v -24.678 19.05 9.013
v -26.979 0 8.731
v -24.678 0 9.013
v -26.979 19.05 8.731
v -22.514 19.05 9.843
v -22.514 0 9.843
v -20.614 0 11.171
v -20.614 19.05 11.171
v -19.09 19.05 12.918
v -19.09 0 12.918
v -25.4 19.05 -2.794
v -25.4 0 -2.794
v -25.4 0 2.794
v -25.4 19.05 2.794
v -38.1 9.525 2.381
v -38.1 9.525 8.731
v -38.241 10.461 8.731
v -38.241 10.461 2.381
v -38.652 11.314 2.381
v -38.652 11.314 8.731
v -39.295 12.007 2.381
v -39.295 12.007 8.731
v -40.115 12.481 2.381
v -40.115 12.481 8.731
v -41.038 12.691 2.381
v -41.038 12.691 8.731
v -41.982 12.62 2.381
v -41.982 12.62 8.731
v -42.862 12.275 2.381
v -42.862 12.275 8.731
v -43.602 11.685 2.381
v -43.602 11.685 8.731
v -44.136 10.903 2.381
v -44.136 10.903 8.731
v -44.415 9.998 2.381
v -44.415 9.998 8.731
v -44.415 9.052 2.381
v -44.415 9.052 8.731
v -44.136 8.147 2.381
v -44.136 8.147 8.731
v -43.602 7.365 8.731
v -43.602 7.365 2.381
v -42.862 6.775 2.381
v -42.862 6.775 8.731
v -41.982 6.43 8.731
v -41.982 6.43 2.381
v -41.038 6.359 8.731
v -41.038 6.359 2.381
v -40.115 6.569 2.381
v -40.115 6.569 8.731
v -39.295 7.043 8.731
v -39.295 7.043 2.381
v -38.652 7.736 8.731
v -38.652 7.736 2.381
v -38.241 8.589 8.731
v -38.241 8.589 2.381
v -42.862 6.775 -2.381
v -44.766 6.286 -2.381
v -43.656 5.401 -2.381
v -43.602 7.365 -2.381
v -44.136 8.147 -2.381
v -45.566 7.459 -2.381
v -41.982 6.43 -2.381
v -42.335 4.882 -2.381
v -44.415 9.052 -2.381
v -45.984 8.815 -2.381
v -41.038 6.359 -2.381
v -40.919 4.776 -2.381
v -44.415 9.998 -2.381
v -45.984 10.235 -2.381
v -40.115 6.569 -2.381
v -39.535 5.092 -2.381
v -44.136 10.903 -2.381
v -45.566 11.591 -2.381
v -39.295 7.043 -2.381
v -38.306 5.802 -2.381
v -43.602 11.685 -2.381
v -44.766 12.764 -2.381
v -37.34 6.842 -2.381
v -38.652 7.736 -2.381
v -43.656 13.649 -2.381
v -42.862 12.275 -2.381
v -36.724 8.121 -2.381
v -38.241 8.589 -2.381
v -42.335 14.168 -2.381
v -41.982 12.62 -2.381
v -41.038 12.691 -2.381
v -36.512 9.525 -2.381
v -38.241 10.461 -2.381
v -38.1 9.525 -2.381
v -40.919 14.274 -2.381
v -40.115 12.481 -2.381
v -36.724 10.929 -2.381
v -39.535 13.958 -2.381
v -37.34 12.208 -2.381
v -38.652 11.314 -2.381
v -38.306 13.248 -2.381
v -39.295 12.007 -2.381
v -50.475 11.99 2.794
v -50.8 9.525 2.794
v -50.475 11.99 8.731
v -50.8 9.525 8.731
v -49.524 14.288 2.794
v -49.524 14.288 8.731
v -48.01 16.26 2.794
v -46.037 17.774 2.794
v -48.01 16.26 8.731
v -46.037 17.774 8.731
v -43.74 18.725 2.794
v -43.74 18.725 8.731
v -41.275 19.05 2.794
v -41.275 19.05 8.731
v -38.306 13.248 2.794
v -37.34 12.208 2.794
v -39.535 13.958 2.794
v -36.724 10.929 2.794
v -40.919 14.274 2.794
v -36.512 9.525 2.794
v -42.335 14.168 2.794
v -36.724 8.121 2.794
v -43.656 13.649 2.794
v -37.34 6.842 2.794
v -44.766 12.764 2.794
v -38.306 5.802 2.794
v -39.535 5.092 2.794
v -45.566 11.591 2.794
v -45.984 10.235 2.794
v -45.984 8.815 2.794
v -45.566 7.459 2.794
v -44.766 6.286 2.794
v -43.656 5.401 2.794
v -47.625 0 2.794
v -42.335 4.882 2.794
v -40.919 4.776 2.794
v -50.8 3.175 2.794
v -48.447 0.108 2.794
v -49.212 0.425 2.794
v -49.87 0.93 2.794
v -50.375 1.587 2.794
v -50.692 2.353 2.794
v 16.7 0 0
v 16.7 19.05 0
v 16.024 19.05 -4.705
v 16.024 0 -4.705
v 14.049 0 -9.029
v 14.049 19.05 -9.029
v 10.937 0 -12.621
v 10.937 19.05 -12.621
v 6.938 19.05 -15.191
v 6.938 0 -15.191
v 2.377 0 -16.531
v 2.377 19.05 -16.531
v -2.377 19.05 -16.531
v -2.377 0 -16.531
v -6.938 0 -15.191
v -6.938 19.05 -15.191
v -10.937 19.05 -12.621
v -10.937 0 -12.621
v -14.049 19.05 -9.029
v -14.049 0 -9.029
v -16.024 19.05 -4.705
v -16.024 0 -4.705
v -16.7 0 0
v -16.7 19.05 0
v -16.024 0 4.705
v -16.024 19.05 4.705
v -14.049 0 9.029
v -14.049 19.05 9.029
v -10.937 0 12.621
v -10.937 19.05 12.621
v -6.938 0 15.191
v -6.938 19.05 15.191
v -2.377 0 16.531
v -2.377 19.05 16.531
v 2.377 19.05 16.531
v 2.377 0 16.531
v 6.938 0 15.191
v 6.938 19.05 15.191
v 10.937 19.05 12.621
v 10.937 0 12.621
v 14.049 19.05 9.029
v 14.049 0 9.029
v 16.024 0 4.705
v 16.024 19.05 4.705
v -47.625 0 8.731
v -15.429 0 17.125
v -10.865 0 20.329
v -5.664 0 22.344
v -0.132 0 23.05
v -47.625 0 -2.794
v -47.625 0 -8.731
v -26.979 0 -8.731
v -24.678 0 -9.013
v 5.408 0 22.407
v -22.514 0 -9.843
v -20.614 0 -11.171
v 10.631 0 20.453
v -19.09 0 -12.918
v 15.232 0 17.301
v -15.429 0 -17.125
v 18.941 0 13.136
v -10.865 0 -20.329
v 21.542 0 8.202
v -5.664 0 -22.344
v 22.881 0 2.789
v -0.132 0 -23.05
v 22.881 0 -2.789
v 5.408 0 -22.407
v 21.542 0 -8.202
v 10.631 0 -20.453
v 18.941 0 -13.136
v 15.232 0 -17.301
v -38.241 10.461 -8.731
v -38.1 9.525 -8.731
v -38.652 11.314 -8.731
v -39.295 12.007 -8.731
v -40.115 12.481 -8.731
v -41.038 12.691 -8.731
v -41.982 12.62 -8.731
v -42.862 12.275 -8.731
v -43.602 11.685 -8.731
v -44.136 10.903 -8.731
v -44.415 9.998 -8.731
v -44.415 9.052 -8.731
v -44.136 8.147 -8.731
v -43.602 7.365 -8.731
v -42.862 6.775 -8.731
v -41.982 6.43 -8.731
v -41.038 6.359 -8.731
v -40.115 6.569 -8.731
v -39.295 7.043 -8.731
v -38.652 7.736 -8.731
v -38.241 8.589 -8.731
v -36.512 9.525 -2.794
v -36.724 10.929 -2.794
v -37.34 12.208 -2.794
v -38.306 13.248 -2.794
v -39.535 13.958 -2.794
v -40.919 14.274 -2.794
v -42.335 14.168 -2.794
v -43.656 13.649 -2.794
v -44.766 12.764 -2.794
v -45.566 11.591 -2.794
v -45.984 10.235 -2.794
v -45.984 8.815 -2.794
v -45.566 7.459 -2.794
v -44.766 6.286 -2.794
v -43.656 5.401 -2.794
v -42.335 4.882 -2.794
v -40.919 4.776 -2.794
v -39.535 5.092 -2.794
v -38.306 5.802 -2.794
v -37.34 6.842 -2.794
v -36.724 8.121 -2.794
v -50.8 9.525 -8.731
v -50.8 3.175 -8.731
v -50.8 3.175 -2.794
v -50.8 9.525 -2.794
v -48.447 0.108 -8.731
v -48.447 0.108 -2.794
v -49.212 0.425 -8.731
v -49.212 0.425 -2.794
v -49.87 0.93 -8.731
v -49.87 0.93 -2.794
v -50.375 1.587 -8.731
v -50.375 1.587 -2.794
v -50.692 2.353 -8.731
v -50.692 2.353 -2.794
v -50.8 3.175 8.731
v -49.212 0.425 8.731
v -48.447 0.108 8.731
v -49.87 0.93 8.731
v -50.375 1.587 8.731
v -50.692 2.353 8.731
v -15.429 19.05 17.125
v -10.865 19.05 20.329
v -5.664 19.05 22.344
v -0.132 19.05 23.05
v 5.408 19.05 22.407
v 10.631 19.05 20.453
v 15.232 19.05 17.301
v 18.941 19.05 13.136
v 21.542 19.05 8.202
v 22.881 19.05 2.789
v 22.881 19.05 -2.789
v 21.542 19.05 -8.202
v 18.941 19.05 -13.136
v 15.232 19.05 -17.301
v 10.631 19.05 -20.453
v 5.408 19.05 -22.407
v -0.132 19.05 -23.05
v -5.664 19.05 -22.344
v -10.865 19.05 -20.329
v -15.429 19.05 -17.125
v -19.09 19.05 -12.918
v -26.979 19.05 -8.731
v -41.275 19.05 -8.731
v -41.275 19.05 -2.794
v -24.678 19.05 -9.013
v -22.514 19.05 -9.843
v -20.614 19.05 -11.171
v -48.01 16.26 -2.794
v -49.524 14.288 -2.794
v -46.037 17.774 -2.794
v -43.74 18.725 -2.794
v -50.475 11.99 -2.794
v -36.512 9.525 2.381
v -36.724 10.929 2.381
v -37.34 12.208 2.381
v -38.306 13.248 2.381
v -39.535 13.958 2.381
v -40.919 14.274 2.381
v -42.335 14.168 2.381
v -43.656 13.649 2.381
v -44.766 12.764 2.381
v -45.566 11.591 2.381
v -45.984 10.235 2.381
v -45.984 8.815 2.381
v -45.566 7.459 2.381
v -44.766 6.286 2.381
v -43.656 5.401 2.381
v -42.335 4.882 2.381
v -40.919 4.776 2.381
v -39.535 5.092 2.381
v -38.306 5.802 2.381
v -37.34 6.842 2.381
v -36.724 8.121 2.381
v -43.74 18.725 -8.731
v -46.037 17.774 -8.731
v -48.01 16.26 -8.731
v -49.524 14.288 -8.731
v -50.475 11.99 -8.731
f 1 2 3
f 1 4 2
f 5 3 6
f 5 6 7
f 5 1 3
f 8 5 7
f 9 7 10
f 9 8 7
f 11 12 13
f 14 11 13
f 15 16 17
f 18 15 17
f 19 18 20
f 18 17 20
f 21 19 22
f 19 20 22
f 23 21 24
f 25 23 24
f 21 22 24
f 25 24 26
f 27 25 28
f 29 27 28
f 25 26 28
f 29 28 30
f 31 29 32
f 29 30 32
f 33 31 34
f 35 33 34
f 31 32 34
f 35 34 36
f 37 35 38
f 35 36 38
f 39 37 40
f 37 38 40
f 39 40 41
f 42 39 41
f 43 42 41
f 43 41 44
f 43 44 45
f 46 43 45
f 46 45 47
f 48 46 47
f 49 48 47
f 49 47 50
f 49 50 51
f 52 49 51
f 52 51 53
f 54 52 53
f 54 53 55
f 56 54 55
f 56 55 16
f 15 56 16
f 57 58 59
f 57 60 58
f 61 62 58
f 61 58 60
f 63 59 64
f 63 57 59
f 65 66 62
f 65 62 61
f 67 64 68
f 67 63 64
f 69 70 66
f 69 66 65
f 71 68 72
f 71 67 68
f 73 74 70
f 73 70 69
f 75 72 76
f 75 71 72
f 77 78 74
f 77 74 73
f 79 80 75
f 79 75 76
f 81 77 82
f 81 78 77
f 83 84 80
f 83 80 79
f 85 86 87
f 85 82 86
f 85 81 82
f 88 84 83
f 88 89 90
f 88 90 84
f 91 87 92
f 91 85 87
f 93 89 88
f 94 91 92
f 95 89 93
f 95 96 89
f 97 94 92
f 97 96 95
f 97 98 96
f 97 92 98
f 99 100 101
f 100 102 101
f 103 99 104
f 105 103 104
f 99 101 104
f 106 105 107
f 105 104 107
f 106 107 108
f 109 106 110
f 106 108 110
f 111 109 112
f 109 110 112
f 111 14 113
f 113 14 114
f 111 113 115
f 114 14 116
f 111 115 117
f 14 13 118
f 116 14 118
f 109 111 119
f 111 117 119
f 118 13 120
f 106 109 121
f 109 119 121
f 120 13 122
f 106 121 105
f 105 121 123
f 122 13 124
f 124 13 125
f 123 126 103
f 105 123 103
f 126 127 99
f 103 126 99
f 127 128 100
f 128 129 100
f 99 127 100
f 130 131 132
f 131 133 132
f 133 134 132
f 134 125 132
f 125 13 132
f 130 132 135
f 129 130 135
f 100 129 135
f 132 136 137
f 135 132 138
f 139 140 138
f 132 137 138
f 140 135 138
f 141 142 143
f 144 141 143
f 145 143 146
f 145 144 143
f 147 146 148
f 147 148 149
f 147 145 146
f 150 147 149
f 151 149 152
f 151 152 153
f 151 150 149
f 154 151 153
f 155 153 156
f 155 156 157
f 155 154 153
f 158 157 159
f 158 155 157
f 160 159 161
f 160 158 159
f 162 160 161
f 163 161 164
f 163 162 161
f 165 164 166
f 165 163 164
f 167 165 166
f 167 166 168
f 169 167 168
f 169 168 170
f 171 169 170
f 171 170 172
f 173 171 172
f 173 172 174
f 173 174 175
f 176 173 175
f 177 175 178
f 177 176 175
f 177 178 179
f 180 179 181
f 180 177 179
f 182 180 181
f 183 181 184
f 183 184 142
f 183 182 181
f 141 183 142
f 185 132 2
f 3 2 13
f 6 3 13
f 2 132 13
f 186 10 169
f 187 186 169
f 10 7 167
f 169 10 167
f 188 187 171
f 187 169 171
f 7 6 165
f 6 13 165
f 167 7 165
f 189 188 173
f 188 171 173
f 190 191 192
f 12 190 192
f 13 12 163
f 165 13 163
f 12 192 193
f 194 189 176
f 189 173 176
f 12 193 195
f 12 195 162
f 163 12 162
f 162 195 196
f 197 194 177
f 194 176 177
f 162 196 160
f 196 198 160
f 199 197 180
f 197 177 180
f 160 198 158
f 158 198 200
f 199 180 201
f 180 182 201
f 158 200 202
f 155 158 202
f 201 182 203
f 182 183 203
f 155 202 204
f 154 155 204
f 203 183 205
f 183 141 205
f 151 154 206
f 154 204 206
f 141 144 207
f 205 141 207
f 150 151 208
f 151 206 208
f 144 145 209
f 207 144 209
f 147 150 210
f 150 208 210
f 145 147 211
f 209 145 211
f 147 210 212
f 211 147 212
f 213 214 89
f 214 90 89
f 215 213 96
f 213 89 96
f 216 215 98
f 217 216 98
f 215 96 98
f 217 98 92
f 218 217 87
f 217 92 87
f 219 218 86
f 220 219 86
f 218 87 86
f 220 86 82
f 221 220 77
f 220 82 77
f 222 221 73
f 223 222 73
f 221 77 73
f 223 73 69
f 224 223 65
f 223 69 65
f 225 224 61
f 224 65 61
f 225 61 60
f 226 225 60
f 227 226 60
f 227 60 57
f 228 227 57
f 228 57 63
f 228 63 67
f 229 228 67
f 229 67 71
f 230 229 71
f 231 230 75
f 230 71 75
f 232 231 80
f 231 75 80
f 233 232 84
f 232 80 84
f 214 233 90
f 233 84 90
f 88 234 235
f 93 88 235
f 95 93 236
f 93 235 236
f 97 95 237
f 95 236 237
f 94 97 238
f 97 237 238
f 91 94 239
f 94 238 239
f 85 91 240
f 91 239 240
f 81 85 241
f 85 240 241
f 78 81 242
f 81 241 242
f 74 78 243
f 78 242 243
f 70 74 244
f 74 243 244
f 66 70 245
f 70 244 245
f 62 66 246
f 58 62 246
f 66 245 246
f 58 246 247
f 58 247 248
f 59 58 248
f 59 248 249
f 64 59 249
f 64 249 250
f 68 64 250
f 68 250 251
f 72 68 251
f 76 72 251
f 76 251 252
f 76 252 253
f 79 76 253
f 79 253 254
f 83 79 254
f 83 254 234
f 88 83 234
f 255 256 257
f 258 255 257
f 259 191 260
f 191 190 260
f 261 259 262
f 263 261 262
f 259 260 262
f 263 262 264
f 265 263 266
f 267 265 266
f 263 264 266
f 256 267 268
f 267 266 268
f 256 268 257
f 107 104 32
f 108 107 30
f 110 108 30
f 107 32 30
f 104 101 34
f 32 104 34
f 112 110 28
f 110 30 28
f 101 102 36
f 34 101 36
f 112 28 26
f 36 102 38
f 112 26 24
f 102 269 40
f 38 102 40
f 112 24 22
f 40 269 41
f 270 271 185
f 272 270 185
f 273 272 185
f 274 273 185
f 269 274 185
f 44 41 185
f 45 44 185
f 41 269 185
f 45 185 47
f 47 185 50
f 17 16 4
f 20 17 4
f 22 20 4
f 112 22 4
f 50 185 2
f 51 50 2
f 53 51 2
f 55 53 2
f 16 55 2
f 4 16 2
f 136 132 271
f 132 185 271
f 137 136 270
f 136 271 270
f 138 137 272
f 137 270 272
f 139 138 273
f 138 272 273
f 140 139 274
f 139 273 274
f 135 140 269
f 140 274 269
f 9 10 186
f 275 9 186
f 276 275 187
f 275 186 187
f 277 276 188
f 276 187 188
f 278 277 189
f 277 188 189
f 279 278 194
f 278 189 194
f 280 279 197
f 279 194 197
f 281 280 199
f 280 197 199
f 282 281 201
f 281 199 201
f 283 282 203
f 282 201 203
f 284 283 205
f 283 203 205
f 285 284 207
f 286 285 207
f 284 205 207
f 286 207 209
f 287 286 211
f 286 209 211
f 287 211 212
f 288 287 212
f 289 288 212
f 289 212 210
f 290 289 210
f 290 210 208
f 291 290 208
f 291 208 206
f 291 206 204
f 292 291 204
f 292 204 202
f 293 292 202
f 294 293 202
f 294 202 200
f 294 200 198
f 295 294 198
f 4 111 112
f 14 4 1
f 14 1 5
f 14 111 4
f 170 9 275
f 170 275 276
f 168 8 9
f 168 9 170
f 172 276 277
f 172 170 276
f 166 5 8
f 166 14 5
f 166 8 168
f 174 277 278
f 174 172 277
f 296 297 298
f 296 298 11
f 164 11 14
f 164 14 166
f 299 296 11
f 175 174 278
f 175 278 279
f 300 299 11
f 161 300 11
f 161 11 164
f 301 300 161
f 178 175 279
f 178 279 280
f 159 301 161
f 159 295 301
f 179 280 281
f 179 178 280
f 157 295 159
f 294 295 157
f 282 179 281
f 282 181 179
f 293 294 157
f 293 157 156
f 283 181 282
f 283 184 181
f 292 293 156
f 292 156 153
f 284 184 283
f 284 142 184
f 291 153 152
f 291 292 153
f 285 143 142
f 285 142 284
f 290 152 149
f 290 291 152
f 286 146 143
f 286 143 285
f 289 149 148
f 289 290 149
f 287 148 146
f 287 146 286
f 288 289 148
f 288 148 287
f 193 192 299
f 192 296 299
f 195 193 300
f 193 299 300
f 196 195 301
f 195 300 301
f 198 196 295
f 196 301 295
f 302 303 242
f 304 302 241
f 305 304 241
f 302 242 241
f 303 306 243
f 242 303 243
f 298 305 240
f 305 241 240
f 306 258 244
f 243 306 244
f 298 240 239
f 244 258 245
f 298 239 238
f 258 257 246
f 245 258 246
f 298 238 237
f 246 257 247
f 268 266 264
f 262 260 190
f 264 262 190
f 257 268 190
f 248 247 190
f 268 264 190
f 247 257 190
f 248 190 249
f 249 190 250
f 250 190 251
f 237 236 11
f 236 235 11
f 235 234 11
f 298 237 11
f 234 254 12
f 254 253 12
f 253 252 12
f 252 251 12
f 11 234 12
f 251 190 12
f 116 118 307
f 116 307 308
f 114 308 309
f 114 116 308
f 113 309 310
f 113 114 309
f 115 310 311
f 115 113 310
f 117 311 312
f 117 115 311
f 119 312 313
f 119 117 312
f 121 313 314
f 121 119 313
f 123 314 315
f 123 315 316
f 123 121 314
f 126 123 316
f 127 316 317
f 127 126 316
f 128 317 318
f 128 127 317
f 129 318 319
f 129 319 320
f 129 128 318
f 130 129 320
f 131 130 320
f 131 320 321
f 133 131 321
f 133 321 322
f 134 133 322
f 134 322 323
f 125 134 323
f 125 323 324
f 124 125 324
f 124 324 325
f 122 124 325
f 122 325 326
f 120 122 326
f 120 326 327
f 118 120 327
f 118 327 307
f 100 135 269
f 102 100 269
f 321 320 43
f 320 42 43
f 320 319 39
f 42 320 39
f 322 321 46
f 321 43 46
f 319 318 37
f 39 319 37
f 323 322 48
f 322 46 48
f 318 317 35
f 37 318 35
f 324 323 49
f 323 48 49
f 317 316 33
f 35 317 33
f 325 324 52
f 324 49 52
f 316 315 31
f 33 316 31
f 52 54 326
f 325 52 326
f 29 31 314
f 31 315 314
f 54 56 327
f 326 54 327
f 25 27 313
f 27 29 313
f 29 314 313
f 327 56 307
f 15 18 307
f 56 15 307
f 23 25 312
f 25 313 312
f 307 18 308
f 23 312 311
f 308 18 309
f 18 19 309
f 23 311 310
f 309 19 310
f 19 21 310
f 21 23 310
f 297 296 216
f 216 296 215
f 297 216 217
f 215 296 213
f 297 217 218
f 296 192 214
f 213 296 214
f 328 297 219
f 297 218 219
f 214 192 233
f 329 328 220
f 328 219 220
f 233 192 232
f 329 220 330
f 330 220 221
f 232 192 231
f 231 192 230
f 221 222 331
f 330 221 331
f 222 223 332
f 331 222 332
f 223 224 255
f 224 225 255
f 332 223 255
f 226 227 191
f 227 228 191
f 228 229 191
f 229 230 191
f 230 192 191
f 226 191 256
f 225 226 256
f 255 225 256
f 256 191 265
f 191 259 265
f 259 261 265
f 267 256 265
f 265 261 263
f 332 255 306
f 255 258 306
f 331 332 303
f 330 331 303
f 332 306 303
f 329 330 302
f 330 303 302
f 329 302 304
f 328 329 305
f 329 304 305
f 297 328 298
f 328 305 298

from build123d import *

# Parameters (mm, degrees)
SKETCH1_R           = 16.7005
BOSS_EXTRUDE1_DEPTH = 19.05
SKETCH2_R           = 3.175
CUT_EXTRUDE1_DEPTH  = 32.78175
SKETCH2_3_R         = 4.7625
SKETCH2_3_R_2       = 3.175
BOSS_EXTRUDE2_DEPTH = 6.35
FILLET1_R           = 9.525
FILLET2_R           = 3.175


with BuildPart() as part:
    # Sketch1 → Boss-Extrude1 (new body)
    with BuildSketch(Plane(origin=(0, 0, 0), x_dir=(1, 0, 0), z_dir=(0, 1, 0))):
        with BuildLine():
            Line((-21.332857842, 8.73125), (-50.8, 8.73125))
            Line((-50.8, 8.73125), (-50.8, 2.794))
            Line((-50.8, 2.794), (-25.4, 2.794))
            Line((-25.4, 2.794), (-25.4, -2.794))
            Line((-25.4, -2.794), (-50.8, -2.794))
            Line((-50.8, -2.794), (-50.8, -8.73125))
            Line((-50.8, -8.73125), (-21.332857842, -8.73125))
            ThreePointArc((-21.332857842, -8.73125), (23.0505, 0), (-21.332857842, 8.73125))
        make_face()
        Circle(SKETCH1_R, mode=Mode.SUBTRACT)
    extrude(amount=BOSS_EXTRUDE1_DEPTH)

    # Sketch2 → Cut-Extrude1 (cut, through all)
    with BuildSketch(Plane.XY.offset(8.73125)):
        with Locations((-41.275, 9.525)):
            Circle(SKETCH2_R)
    extrude(amount=-CUT_EXTRUDE1_DEPTH, mode=Mode.SUBTRACT)

    # Sketch2<3> → Boss-Extrude2 (add)
    with BuildSketch(Plane.XY.offset(8.73125)):
        with Locations((-41.275, 9.525)):
            Circle(SKETCH2_3_R)
        with Locations((-41.275, 9.525)):
            Circle(SKETCH2_3_R_2, mode=Mode.SUBTRACT)
    boss_extrude2 = extrude(amount=-BOSS_EXTRUDE2_DEPTH)

    # Mirror1: Boss-Extrude2 across plane
    add(boss_extrude2.mirror(Plane.XY))

    # Fillet1
    fillet1_edges = [part.edges().sort_by_distance(p)[0] for p in [
        (-50.8, 19.05, -5.762625),
        (-21.332857842, 9.525, -8.73125),
        (-21.332857842, 9.525, 8.73125),
        (-50.8, 19.05, 5.762625),
    ]]
    fillet(fillet1_edges, radius=FILLET1_R)

    # Fillet2
    fillet2_edges = [part.edges().sort_by_distance(p)[0] for p in [
        (-50.8, 0, 5.762625),
        (-50.8, 0, -5.762625),
    ]]
    fillet(fillet2_edges, radius=FILLET2_R)


solid = part.part
